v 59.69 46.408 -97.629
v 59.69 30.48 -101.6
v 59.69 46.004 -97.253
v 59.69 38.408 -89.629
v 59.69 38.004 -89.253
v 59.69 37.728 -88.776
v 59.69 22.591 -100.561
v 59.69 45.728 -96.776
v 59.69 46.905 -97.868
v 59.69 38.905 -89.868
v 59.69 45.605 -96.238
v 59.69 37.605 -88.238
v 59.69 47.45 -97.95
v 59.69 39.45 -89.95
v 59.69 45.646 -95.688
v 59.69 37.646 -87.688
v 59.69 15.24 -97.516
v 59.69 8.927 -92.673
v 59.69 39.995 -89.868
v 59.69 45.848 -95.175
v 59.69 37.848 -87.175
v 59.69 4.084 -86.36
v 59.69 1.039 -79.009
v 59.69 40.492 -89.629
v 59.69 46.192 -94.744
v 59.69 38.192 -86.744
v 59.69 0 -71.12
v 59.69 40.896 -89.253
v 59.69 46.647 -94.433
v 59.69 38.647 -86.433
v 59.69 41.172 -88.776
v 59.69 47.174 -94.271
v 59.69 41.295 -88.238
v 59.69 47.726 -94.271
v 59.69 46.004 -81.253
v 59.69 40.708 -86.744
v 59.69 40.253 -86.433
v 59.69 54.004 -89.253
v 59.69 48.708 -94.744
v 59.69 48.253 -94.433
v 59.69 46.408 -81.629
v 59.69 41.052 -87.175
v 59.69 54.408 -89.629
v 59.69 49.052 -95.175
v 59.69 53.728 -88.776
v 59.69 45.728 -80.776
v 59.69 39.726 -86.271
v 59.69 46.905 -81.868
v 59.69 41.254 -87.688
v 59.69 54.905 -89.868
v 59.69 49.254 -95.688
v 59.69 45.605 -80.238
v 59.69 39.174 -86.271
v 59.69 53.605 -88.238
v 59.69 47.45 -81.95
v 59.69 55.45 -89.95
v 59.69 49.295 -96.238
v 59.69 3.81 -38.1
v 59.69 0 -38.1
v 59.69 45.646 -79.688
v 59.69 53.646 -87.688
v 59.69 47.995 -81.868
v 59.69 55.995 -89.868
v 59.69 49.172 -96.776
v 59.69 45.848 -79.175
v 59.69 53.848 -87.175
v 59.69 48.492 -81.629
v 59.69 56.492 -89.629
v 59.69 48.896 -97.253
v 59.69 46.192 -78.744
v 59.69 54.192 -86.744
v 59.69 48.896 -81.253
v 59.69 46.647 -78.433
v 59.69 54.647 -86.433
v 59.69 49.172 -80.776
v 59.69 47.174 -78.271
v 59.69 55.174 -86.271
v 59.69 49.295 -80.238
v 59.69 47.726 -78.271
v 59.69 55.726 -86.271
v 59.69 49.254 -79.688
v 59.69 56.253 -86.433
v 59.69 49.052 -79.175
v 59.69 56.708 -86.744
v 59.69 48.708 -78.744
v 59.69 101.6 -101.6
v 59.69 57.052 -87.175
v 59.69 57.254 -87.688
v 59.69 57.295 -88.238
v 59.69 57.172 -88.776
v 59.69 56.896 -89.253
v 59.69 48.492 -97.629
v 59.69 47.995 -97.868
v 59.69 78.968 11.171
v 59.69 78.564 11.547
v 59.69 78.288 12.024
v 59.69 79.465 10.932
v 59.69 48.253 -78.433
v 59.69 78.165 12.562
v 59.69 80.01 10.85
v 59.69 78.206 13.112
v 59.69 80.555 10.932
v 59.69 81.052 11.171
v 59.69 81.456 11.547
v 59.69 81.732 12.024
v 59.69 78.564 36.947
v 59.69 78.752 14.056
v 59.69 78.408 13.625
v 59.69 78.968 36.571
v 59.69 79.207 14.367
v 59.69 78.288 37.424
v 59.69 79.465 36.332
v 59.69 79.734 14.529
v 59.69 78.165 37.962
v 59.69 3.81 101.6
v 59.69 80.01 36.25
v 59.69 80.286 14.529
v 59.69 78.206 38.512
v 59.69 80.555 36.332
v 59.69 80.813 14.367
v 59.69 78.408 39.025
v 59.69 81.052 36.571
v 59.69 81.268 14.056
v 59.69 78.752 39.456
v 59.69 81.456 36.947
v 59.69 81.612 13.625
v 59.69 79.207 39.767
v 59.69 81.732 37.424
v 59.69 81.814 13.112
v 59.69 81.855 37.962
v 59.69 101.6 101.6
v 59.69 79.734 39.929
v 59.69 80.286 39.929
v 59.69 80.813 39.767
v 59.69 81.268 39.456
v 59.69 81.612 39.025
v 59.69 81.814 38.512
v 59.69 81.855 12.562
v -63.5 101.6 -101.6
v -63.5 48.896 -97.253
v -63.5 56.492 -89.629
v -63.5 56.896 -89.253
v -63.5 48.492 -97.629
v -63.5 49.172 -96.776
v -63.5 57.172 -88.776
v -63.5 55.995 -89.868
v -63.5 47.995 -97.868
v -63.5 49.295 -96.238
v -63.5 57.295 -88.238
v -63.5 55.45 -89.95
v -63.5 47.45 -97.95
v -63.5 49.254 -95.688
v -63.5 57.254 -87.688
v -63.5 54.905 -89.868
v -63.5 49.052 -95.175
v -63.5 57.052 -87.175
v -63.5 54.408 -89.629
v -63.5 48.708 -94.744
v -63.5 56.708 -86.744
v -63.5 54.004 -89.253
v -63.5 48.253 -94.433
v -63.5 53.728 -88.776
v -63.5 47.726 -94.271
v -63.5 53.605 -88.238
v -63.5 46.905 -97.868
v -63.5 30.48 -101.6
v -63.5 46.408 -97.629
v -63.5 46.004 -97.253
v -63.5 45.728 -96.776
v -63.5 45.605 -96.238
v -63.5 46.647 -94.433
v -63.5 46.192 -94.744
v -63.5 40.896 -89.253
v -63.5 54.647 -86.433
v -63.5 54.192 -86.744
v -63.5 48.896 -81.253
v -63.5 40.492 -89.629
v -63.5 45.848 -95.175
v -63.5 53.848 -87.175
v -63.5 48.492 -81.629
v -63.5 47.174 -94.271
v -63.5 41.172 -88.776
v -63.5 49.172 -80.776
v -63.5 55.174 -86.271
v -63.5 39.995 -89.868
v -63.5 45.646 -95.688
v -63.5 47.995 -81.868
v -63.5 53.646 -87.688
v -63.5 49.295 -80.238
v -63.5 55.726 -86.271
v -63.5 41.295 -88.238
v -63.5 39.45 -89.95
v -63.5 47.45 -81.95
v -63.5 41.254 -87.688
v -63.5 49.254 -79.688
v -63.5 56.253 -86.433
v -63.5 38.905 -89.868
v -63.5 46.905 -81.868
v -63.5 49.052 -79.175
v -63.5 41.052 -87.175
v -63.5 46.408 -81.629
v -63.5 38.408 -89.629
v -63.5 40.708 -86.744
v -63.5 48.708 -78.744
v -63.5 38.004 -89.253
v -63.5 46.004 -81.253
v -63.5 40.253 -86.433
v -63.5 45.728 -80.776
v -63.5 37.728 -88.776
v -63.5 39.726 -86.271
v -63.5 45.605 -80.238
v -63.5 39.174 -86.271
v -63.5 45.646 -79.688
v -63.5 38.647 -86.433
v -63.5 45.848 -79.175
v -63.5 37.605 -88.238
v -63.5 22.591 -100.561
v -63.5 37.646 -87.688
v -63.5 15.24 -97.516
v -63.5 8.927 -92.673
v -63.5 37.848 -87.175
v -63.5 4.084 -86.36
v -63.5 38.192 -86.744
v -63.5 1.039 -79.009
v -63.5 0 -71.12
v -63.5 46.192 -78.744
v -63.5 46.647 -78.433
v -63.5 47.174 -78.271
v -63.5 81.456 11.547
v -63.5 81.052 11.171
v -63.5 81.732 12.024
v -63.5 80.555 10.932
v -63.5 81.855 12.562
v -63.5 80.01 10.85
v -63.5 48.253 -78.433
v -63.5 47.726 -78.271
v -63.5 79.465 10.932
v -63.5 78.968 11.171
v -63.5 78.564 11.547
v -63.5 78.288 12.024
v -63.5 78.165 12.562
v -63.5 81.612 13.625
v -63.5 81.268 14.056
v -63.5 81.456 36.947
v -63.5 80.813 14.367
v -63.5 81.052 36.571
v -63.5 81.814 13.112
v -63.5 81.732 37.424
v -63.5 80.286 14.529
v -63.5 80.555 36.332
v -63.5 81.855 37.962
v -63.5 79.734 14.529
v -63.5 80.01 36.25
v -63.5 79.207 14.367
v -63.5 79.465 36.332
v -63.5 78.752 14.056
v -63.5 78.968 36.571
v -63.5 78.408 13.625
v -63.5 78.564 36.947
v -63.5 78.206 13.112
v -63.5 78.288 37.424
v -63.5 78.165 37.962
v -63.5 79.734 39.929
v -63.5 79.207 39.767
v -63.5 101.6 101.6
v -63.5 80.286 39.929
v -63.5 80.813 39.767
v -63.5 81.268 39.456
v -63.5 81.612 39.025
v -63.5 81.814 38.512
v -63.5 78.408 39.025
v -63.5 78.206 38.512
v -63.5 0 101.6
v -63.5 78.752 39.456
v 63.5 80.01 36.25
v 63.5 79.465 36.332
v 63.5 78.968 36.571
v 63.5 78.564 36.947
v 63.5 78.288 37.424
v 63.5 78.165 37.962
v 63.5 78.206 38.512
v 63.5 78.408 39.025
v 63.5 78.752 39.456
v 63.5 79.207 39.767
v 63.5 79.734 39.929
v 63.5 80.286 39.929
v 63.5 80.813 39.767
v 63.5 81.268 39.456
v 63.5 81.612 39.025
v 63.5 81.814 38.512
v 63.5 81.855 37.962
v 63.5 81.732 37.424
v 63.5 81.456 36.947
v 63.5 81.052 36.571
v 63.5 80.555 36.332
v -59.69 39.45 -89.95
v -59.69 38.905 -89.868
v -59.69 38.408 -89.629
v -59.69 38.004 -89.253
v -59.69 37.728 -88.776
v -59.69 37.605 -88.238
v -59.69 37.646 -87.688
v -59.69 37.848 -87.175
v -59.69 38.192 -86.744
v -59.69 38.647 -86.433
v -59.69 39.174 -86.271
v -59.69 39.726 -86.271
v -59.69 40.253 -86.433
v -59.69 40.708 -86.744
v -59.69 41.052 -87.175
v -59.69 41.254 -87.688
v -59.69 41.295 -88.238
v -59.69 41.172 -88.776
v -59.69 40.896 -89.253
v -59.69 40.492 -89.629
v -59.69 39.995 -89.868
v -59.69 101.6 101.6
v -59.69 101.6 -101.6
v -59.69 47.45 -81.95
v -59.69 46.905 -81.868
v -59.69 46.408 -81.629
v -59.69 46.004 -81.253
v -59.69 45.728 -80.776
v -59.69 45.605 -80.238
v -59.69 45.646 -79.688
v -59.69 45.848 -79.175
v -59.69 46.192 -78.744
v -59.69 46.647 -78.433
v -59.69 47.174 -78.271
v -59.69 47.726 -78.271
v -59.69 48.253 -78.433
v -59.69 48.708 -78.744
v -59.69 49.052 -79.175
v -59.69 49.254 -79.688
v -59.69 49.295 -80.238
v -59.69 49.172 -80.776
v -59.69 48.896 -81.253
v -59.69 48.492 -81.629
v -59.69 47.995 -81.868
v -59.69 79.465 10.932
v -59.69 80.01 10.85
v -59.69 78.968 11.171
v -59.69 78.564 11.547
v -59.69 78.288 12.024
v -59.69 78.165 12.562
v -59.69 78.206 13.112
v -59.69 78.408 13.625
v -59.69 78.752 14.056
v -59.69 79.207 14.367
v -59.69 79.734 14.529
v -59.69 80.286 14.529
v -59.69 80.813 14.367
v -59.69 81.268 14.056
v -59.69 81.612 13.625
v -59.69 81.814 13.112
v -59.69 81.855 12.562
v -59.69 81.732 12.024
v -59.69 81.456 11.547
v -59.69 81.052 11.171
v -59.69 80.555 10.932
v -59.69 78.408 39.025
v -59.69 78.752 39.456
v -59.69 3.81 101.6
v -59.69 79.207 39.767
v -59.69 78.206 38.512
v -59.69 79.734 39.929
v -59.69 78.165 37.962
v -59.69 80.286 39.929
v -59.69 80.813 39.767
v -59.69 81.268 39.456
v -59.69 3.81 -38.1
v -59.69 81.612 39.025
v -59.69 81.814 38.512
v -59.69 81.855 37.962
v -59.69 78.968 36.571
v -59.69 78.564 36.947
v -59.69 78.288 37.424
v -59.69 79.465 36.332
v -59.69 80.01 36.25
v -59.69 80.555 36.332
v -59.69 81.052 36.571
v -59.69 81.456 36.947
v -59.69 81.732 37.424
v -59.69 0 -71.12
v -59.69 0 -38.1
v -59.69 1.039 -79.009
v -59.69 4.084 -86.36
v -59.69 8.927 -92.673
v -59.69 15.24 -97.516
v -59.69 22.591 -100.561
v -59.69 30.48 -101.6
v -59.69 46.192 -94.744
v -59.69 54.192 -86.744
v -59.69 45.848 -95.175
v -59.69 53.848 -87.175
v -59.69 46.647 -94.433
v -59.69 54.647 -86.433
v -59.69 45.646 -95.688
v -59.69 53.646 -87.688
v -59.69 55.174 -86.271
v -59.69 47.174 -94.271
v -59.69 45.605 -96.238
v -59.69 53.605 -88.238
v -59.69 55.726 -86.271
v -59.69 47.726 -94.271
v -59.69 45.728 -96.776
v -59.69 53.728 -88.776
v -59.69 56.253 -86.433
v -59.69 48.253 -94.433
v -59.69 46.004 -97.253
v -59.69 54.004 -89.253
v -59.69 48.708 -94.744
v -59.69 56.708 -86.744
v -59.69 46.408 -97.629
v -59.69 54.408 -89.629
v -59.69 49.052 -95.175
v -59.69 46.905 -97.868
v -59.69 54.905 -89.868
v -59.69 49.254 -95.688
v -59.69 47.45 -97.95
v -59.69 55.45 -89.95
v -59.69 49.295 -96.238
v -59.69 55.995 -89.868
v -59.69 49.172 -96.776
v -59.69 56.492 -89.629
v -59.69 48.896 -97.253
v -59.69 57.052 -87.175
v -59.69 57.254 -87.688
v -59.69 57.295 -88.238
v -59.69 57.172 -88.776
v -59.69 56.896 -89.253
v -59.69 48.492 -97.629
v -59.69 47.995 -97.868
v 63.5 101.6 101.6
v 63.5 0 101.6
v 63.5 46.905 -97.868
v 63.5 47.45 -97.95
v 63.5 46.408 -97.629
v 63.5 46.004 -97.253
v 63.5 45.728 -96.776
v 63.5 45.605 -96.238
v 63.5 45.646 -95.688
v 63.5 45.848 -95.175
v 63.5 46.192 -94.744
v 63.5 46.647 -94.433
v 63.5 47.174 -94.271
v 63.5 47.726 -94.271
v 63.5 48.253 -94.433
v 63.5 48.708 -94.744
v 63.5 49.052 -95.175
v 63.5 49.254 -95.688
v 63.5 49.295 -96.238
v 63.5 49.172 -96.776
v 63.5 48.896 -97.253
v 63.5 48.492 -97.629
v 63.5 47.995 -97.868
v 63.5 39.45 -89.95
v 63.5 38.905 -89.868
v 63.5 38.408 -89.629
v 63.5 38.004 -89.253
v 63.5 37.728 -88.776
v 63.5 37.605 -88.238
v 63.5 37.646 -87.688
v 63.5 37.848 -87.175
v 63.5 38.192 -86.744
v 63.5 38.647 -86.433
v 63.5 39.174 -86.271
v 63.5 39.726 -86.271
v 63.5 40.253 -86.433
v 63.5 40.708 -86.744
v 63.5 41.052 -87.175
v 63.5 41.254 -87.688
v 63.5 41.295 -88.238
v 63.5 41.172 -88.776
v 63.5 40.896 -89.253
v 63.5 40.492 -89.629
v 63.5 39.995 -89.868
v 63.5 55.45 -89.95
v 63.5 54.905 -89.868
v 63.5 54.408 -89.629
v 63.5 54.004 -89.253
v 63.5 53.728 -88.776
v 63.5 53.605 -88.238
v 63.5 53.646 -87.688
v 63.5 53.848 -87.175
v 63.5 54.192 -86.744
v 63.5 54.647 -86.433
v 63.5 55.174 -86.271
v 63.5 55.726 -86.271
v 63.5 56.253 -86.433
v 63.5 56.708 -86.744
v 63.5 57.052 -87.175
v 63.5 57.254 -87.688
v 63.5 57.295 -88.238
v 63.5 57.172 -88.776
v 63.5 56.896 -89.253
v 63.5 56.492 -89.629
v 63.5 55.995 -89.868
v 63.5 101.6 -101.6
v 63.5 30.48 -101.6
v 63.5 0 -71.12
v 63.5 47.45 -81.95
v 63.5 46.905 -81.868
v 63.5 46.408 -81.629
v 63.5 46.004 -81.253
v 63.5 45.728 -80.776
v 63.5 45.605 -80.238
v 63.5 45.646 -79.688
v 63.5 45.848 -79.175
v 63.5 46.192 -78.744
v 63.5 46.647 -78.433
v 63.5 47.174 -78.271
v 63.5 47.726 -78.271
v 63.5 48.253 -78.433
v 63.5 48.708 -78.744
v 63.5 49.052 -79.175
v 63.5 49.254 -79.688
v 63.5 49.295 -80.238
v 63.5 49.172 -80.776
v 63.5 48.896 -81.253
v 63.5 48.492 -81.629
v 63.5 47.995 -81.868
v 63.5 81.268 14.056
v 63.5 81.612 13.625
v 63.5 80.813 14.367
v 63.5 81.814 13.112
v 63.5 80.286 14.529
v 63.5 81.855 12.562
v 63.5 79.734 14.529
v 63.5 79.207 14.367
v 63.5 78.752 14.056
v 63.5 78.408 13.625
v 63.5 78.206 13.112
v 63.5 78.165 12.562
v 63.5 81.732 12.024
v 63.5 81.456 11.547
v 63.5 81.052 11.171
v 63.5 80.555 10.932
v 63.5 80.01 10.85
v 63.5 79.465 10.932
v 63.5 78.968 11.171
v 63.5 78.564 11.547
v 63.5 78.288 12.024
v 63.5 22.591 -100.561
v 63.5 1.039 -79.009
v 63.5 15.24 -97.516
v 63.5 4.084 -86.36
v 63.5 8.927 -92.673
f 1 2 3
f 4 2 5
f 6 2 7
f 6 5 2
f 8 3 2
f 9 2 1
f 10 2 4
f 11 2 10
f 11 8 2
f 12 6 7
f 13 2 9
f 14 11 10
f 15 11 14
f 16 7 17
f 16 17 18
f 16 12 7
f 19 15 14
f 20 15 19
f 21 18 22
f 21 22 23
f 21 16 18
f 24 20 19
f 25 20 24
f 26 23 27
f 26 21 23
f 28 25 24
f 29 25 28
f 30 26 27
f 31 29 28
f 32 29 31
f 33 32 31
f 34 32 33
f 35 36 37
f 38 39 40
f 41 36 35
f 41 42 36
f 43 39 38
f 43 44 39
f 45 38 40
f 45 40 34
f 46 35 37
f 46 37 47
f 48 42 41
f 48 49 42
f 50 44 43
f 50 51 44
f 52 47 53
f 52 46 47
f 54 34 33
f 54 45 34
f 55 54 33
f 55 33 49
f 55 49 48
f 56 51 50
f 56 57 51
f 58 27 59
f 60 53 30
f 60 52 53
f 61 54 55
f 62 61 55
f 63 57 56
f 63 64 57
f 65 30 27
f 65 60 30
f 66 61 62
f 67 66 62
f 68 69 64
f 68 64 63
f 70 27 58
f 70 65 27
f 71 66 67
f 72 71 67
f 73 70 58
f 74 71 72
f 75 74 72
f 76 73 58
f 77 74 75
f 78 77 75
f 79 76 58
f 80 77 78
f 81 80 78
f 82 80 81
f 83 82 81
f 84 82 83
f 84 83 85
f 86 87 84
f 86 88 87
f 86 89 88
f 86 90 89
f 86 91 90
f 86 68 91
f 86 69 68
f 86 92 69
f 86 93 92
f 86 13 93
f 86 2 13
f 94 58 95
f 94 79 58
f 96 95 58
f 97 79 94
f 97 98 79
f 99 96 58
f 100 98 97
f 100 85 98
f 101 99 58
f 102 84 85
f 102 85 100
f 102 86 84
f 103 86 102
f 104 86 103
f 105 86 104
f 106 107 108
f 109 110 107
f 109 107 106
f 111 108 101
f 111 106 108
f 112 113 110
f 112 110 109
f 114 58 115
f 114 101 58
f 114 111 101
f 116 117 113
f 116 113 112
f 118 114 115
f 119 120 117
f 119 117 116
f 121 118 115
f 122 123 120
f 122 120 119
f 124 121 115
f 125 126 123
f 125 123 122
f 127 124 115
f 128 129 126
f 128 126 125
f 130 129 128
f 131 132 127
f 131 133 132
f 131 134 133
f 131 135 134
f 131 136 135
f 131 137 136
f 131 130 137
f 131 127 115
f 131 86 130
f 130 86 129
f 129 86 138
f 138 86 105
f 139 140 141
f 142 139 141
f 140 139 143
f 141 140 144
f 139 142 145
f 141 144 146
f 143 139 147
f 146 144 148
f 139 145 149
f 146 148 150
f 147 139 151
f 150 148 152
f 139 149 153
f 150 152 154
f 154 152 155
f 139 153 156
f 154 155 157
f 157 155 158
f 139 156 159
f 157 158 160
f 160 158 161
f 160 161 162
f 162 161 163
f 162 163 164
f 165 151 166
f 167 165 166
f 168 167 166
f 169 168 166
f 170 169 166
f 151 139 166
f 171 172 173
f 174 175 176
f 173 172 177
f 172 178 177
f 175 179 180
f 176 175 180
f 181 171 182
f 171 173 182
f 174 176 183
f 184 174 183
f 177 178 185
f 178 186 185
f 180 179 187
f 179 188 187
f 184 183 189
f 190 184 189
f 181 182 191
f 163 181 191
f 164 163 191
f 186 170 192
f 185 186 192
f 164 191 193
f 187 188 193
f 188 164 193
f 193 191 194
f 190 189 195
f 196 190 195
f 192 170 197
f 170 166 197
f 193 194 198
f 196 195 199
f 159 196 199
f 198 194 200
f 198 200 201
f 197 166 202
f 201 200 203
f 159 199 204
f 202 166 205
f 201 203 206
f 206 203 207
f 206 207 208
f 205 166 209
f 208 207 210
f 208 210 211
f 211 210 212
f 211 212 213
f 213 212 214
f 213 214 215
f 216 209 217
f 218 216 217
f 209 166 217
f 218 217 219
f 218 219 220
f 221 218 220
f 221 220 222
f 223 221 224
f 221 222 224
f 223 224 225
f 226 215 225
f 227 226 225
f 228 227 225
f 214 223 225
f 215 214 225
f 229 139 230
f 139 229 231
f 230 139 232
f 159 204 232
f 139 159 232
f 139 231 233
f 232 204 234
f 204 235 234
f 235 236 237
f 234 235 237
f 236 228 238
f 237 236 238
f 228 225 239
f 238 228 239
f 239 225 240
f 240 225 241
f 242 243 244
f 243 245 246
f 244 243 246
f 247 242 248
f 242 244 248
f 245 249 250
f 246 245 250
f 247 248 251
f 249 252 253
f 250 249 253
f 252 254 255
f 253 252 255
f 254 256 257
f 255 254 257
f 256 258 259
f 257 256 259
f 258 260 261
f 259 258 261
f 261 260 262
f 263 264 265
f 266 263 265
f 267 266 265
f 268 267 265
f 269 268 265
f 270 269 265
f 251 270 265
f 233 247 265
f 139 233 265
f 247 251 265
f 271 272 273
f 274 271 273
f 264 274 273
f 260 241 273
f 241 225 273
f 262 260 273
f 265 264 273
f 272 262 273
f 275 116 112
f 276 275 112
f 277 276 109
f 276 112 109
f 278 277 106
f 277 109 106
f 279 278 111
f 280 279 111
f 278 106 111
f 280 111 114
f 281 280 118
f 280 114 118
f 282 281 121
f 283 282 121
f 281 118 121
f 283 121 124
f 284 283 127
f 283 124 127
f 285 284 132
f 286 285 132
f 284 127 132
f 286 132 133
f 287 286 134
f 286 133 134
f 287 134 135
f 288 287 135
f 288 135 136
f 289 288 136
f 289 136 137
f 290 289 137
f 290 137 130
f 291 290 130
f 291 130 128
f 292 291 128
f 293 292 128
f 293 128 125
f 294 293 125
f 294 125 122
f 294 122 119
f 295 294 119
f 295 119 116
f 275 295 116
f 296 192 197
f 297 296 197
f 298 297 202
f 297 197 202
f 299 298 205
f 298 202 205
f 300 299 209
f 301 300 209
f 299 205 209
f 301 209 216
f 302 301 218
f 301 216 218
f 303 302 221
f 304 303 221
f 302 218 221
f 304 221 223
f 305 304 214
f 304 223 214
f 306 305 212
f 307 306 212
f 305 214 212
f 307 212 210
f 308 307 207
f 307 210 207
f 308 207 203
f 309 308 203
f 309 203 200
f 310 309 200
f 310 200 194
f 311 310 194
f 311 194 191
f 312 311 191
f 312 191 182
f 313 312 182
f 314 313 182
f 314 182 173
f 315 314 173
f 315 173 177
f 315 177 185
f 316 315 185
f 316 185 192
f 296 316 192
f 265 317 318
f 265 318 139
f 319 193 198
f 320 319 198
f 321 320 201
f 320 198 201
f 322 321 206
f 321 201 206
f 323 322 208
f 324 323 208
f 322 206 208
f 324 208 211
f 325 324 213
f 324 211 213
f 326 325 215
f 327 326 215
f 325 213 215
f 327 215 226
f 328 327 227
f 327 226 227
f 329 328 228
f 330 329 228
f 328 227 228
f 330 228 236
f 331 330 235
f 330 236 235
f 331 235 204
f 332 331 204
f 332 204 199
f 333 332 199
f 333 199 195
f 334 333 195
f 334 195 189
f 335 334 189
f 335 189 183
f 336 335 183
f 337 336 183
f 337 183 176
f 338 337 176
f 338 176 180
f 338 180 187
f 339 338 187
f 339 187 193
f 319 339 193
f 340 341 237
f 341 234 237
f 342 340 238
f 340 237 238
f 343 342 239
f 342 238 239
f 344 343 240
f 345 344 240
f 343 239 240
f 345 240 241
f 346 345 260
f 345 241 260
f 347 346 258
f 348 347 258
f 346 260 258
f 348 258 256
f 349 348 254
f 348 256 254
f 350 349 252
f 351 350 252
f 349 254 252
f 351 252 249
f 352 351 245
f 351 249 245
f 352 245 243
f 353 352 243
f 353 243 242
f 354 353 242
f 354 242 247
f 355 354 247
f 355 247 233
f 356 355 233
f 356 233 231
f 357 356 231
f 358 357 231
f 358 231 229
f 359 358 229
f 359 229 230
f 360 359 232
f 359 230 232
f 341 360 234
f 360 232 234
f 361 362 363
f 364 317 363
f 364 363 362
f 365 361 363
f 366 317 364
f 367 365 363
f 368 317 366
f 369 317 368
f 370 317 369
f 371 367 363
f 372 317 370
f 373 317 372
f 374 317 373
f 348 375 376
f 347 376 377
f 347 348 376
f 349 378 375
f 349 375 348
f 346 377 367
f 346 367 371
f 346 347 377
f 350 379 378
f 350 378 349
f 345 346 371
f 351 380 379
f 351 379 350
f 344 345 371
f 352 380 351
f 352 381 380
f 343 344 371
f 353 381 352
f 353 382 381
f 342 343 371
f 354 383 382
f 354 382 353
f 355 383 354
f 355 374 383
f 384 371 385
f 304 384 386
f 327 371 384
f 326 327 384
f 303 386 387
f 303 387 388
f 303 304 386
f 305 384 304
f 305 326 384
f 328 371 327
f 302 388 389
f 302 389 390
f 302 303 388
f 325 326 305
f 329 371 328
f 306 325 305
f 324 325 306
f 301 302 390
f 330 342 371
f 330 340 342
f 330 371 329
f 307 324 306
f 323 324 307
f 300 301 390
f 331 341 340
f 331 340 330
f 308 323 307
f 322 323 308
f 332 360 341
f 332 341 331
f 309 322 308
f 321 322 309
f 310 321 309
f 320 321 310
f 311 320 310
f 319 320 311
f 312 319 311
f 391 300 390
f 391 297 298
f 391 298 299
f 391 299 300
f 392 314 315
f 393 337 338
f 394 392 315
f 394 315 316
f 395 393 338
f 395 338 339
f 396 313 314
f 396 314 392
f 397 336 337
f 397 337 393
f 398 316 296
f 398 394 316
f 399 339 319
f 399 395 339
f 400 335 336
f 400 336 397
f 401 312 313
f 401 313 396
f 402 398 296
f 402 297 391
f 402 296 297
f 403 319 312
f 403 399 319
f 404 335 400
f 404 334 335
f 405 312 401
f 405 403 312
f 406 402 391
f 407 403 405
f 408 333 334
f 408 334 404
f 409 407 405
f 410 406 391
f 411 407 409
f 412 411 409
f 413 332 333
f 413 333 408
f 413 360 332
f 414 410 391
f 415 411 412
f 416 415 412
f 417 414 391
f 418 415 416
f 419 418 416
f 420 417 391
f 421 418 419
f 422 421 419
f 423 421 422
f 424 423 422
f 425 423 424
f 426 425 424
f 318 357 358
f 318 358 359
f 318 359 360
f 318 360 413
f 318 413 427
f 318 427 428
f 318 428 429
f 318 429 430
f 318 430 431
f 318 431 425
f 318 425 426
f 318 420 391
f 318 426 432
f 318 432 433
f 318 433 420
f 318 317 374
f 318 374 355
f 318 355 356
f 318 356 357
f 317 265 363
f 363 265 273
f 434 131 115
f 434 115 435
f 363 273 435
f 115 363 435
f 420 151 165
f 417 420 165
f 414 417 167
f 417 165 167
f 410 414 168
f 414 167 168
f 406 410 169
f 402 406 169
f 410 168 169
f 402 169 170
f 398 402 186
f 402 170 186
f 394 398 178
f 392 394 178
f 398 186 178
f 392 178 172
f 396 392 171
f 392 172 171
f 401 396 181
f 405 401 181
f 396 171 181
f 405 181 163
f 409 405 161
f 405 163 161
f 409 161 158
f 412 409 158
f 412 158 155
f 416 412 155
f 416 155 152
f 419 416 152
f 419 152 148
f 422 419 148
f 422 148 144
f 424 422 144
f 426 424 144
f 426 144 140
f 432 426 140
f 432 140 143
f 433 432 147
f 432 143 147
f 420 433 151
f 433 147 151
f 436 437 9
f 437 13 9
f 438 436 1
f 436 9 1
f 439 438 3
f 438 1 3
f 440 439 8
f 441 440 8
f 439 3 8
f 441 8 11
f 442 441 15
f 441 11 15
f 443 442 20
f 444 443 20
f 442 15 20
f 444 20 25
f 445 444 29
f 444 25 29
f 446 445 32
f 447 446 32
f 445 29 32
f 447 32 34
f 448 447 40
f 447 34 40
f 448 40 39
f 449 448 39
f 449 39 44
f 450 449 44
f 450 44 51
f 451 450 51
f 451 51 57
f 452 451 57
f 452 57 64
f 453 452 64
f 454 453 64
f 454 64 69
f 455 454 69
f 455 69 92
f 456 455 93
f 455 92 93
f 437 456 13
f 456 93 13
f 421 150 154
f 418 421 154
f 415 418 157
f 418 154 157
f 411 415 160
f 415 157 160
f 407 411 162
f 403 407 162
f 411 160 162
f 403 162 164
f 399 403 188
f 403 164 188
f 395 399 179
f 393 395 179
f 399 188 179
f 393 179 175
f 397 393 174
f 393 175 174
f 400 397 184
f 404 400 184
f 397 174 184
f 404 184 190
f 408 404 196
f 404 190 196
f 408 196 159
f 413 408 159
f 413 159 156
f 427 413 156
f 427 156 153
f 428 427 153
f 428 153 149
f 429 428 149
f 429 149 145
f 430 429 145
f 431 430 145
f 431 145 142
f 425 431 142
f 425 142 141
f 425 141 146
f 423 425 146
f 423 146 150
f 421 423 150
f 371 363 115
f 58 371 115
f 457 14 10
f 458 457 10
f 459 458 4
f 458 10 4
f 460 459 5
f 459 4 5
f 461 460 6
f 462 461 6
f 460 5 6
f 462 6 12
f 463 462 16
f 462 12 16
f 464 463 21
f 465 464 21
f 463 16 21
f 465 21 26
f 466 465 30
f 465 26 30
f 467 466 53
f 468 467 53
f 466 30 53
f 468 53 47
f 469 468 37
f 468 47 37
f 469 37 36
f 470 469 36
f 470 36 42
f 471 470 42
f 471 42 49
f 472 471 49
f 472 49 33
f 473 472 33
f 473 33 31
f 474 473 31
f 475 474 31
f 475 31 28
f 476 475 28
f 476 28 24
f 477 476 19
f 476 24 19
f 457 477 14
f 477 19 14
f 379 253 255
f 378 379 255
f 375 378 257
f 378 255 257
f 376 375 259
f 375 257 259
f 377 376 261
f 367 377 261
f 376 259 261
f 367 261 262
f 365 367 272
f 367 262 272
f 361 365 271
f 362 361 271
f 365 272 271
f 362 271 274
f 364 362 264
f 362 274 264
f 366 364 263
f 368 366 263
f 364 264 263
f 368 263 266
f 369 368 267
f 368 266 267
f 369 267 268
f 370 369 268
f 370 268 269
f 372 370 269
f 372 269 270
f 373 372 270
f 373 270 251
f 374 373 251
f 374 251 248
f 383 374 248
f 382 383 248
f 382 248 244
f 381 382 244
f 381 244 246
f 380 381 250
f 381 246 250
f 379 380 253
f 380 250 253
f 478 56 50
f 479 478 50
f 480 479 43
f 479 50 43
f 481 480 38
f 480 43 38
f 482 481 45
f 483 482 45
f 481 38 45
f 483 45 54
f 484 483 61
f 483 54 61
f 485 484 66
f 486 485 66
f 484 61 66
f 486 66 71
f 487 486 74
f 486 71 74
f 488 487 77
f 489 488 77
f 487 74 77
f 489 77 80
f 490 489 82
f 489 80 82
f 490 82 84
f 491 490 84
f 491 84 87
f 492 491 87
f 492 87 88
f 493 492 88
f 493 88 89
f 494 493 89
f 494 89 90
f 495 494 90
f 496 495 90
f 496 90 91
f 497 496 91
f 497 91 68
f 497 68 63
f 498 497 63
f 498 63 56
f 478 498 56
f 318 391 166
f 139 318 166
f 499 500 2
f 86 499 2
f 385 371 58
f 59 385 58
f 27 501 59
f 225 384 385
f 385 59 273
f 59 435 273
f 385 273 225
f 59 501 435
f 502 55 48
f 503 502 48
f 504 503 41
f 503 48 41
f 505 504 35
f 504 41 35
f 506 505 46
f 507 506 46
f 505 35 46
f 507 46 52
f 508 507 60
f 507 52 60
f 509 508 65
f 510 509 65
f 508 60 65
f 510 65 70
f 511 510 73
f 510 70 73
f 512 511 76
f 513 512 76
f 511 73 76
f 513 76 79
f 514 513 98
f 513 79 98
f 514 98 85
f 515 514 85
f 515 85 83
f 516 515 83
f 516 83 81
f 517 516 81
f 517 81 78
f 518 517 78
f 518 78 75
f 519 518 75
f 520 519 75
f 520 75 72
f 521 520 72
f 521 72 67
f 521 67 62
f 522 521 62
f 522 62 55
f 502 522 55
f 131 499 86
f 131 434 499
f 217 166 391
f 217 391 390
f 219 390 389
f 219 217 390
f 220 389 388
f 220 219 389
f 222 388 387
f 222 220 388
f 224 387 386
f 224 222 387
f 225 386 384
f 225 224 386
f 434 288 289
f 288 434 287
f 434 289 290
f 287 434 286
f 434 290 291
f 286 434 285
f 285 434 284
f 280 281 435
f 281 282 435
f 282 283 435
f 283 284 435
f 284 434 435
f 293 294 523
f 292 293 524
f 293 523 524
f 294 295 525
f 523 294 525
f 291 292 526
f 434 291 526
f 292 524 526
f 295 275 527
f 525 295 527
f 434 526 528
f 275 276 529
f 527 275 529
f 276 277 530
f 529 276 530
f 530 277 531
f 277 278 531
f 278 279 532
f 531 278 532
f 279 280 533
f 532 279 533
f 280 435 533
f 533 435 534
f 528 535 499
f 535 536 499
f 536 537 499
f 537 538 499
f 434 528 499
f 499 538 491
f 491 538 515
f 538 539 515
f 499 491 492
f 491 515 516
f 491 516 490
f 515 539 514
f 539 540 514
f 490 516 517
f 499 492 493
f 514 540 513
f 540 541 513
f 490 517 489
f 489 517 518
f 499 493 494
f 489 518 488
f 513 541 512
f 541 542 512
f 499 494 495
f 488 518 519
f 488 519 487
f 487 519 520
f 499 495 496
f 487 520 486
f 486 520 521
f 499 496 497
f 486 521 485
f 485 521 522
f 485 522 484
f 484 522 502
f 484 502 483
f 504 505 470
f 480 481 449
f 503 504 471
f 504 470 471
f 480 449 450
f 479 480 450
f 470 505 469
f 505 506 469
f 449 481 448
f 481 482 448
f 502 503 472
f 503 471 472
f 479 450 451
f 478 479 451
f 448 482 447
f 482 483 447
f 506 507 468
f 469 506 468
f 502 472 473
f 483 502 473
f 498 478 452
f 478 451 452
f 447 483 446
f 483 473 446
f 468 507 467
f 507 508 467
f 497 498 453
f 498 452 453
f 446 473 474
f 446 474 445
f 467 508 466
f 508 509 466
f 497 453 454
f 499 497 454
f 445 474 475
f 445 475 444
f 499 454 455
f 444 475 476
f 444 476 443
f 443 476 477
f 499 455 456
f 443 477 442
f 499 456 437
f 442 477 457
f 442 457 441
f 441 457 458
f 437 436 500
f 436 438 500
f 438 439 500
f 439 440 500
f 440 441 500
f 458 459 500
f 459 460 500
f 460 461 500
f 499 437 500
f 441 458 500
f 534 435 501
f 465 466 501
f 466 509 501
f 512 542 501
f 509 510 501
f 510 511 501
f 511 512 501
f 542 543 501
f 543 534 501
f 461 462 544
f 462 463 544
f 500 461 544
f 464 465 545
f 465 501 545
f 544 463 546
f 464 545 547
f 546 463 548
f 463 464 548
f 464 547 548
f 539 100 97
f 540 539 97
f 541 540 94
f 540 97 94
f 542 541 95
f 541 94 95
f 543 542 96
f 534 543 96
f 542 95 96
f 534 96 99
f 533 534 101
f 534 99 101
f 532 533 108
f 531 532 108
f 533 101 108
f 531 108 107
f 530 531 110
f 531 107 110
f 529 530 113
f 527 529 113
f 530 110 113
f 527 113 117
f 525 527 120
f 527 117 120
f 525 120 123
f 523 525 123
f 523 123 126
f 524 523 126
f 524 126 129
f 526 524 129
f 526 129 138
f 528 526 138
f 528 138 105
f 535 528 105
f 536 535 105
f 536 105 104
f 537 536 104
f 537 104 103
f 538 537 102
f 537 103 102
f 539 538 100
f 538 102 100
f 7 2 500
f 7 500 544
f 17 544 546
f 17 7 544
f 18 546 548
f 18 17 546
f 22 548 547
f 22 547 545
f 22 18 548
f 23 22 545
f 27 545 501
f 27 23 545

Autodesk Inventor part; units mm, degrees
ref_plane "YZ Plane" through (0, 0, 0) normal (1, 0, 0) x (0, 1, 0)
ref_plane "XZ Plane" through (0, 0, 0) normal (0, 1, 0) x (-1, 0, 0)
ref_plane "XY Plane" through (0, 0, 0) normal (0, 0, 1) x (1, 0, 0)
sketch "Sketch1" plane through (0, 0, 0) normal (0, 1, 0) x (-1, 0, 0)
  line L0 (-63.5, -101.6) -> (63.5, -101.6)
  line L1 (63.5, -101.6) -> (63.5, 101.6)
  line L2 (63.5, 101.6) -> (-63.5, 101.6)
  line L3 (-63.5, 101.6) -> (-63.5, -101.6)
  line L4 (-63.5, -101.6) -> (63.5, 101.6) construction
  line L5 (63.5, -101.6) -> (-63.5, 101.6) construction
  point P0 (0, 0)
  dimension "d0" = 127
  dimension "d1" = 203.2
extrude "Extrusion1" add sketch "Sketch1" along normal blind 101.6
sketch "Sketch3" plane through (0, 101.6, 0) normal (0, 1, 0) x (1, 0, 0)
  line L0 (63.5, 101.6) -> (-63.5, 101.6) projected
  line L1 (59.69, -101.6) -> (-59.69, -101.6)
  line L2 (-59.69, -101.6) -> (-59.69, 101.6)
  line L3 (-59.69, 101.6) -> (59.69, 101.6)
  line L4 (59.69, 101.6) -> (59.69, -101.6)
  line L5 (59.69, -101.6) -> (-59.69, 101.6) construction
  line L6 (-59.69, -101.6) -> (59.69, 101.6) construction
  point P0 (0, 0)
  dimension "d4" = 119.38
extrude "Extrusion2" cut sketch "Sketch3" against normal blind 97.79
sketch "Sketch4" plane through (0, 3.81, 0) normal (0, 1, 0) x (1, 0, 0)
  line L0 (59.69, 101.6) -> (59.69, -101.6) projected
  line L1 (-59.69, 101.6) -> (59.69, 101.6) projected
  line L2 (59.69, 101.6) -> (-59.69, 101.6)
  line L3 (-59.69, 101.6) -> (-59.69, 38.1)
  line L4 (-59.69, 38.1) -> (59.69, 38.1)
  line L5 (59.69, 38.1) -> (59.69, 101.6)
  point P0 (0, 0)
  dimension "d7" = 63.5
extrude "Extrusion3" cut sketch "Sketch4" against normal blind 3.81
fillet "Fillet1" radius 30.48 2 edges at (61.595, 0, -101.6) (-61.595, 0, -101.6)
sketch "Sketch7" plane through (63.5, 0, 101.6) normal (1, 0, 0) x (0, 0, -1)
  circle A0 centre (189.7, 55.45) radius 1.85 projected
  circle A1 centre (197.7, 47.45) radius 1.85 projected
  circle A2 centre (181.7, 47.45) radius 1.85 projected
  circle A3 centre (189.7, 39.45) radius 1.85 projected
  point P0 (101.6, 0)
hole "Hole2" at (63.5, 55.45, -88.1) at (63.5, 47.45, -96.1) at (63.5, 47.45, -80.1) at (63.5, 39.45, -88.1) direction (-1, 0, 0) diameter 3.7 end through all
sketch "Sketch8" plane through (63.5, 0, 101.6) normal (1, 0, 0) x (0, 0, -1)
  circle A0 centre (63.5, 80.01) radius 1.85 projected
  circle A1 centre (88.9, 80.01) radius 1.85 projected
  point P0 (101.6, 0)
hole "Hole3" at (63.5, 80.01, 38.1) at (63.5, 80.01, 12.7) direction (-1, 0, 0) diameter 3.7 end through all
properties part number "Base Bucket"
